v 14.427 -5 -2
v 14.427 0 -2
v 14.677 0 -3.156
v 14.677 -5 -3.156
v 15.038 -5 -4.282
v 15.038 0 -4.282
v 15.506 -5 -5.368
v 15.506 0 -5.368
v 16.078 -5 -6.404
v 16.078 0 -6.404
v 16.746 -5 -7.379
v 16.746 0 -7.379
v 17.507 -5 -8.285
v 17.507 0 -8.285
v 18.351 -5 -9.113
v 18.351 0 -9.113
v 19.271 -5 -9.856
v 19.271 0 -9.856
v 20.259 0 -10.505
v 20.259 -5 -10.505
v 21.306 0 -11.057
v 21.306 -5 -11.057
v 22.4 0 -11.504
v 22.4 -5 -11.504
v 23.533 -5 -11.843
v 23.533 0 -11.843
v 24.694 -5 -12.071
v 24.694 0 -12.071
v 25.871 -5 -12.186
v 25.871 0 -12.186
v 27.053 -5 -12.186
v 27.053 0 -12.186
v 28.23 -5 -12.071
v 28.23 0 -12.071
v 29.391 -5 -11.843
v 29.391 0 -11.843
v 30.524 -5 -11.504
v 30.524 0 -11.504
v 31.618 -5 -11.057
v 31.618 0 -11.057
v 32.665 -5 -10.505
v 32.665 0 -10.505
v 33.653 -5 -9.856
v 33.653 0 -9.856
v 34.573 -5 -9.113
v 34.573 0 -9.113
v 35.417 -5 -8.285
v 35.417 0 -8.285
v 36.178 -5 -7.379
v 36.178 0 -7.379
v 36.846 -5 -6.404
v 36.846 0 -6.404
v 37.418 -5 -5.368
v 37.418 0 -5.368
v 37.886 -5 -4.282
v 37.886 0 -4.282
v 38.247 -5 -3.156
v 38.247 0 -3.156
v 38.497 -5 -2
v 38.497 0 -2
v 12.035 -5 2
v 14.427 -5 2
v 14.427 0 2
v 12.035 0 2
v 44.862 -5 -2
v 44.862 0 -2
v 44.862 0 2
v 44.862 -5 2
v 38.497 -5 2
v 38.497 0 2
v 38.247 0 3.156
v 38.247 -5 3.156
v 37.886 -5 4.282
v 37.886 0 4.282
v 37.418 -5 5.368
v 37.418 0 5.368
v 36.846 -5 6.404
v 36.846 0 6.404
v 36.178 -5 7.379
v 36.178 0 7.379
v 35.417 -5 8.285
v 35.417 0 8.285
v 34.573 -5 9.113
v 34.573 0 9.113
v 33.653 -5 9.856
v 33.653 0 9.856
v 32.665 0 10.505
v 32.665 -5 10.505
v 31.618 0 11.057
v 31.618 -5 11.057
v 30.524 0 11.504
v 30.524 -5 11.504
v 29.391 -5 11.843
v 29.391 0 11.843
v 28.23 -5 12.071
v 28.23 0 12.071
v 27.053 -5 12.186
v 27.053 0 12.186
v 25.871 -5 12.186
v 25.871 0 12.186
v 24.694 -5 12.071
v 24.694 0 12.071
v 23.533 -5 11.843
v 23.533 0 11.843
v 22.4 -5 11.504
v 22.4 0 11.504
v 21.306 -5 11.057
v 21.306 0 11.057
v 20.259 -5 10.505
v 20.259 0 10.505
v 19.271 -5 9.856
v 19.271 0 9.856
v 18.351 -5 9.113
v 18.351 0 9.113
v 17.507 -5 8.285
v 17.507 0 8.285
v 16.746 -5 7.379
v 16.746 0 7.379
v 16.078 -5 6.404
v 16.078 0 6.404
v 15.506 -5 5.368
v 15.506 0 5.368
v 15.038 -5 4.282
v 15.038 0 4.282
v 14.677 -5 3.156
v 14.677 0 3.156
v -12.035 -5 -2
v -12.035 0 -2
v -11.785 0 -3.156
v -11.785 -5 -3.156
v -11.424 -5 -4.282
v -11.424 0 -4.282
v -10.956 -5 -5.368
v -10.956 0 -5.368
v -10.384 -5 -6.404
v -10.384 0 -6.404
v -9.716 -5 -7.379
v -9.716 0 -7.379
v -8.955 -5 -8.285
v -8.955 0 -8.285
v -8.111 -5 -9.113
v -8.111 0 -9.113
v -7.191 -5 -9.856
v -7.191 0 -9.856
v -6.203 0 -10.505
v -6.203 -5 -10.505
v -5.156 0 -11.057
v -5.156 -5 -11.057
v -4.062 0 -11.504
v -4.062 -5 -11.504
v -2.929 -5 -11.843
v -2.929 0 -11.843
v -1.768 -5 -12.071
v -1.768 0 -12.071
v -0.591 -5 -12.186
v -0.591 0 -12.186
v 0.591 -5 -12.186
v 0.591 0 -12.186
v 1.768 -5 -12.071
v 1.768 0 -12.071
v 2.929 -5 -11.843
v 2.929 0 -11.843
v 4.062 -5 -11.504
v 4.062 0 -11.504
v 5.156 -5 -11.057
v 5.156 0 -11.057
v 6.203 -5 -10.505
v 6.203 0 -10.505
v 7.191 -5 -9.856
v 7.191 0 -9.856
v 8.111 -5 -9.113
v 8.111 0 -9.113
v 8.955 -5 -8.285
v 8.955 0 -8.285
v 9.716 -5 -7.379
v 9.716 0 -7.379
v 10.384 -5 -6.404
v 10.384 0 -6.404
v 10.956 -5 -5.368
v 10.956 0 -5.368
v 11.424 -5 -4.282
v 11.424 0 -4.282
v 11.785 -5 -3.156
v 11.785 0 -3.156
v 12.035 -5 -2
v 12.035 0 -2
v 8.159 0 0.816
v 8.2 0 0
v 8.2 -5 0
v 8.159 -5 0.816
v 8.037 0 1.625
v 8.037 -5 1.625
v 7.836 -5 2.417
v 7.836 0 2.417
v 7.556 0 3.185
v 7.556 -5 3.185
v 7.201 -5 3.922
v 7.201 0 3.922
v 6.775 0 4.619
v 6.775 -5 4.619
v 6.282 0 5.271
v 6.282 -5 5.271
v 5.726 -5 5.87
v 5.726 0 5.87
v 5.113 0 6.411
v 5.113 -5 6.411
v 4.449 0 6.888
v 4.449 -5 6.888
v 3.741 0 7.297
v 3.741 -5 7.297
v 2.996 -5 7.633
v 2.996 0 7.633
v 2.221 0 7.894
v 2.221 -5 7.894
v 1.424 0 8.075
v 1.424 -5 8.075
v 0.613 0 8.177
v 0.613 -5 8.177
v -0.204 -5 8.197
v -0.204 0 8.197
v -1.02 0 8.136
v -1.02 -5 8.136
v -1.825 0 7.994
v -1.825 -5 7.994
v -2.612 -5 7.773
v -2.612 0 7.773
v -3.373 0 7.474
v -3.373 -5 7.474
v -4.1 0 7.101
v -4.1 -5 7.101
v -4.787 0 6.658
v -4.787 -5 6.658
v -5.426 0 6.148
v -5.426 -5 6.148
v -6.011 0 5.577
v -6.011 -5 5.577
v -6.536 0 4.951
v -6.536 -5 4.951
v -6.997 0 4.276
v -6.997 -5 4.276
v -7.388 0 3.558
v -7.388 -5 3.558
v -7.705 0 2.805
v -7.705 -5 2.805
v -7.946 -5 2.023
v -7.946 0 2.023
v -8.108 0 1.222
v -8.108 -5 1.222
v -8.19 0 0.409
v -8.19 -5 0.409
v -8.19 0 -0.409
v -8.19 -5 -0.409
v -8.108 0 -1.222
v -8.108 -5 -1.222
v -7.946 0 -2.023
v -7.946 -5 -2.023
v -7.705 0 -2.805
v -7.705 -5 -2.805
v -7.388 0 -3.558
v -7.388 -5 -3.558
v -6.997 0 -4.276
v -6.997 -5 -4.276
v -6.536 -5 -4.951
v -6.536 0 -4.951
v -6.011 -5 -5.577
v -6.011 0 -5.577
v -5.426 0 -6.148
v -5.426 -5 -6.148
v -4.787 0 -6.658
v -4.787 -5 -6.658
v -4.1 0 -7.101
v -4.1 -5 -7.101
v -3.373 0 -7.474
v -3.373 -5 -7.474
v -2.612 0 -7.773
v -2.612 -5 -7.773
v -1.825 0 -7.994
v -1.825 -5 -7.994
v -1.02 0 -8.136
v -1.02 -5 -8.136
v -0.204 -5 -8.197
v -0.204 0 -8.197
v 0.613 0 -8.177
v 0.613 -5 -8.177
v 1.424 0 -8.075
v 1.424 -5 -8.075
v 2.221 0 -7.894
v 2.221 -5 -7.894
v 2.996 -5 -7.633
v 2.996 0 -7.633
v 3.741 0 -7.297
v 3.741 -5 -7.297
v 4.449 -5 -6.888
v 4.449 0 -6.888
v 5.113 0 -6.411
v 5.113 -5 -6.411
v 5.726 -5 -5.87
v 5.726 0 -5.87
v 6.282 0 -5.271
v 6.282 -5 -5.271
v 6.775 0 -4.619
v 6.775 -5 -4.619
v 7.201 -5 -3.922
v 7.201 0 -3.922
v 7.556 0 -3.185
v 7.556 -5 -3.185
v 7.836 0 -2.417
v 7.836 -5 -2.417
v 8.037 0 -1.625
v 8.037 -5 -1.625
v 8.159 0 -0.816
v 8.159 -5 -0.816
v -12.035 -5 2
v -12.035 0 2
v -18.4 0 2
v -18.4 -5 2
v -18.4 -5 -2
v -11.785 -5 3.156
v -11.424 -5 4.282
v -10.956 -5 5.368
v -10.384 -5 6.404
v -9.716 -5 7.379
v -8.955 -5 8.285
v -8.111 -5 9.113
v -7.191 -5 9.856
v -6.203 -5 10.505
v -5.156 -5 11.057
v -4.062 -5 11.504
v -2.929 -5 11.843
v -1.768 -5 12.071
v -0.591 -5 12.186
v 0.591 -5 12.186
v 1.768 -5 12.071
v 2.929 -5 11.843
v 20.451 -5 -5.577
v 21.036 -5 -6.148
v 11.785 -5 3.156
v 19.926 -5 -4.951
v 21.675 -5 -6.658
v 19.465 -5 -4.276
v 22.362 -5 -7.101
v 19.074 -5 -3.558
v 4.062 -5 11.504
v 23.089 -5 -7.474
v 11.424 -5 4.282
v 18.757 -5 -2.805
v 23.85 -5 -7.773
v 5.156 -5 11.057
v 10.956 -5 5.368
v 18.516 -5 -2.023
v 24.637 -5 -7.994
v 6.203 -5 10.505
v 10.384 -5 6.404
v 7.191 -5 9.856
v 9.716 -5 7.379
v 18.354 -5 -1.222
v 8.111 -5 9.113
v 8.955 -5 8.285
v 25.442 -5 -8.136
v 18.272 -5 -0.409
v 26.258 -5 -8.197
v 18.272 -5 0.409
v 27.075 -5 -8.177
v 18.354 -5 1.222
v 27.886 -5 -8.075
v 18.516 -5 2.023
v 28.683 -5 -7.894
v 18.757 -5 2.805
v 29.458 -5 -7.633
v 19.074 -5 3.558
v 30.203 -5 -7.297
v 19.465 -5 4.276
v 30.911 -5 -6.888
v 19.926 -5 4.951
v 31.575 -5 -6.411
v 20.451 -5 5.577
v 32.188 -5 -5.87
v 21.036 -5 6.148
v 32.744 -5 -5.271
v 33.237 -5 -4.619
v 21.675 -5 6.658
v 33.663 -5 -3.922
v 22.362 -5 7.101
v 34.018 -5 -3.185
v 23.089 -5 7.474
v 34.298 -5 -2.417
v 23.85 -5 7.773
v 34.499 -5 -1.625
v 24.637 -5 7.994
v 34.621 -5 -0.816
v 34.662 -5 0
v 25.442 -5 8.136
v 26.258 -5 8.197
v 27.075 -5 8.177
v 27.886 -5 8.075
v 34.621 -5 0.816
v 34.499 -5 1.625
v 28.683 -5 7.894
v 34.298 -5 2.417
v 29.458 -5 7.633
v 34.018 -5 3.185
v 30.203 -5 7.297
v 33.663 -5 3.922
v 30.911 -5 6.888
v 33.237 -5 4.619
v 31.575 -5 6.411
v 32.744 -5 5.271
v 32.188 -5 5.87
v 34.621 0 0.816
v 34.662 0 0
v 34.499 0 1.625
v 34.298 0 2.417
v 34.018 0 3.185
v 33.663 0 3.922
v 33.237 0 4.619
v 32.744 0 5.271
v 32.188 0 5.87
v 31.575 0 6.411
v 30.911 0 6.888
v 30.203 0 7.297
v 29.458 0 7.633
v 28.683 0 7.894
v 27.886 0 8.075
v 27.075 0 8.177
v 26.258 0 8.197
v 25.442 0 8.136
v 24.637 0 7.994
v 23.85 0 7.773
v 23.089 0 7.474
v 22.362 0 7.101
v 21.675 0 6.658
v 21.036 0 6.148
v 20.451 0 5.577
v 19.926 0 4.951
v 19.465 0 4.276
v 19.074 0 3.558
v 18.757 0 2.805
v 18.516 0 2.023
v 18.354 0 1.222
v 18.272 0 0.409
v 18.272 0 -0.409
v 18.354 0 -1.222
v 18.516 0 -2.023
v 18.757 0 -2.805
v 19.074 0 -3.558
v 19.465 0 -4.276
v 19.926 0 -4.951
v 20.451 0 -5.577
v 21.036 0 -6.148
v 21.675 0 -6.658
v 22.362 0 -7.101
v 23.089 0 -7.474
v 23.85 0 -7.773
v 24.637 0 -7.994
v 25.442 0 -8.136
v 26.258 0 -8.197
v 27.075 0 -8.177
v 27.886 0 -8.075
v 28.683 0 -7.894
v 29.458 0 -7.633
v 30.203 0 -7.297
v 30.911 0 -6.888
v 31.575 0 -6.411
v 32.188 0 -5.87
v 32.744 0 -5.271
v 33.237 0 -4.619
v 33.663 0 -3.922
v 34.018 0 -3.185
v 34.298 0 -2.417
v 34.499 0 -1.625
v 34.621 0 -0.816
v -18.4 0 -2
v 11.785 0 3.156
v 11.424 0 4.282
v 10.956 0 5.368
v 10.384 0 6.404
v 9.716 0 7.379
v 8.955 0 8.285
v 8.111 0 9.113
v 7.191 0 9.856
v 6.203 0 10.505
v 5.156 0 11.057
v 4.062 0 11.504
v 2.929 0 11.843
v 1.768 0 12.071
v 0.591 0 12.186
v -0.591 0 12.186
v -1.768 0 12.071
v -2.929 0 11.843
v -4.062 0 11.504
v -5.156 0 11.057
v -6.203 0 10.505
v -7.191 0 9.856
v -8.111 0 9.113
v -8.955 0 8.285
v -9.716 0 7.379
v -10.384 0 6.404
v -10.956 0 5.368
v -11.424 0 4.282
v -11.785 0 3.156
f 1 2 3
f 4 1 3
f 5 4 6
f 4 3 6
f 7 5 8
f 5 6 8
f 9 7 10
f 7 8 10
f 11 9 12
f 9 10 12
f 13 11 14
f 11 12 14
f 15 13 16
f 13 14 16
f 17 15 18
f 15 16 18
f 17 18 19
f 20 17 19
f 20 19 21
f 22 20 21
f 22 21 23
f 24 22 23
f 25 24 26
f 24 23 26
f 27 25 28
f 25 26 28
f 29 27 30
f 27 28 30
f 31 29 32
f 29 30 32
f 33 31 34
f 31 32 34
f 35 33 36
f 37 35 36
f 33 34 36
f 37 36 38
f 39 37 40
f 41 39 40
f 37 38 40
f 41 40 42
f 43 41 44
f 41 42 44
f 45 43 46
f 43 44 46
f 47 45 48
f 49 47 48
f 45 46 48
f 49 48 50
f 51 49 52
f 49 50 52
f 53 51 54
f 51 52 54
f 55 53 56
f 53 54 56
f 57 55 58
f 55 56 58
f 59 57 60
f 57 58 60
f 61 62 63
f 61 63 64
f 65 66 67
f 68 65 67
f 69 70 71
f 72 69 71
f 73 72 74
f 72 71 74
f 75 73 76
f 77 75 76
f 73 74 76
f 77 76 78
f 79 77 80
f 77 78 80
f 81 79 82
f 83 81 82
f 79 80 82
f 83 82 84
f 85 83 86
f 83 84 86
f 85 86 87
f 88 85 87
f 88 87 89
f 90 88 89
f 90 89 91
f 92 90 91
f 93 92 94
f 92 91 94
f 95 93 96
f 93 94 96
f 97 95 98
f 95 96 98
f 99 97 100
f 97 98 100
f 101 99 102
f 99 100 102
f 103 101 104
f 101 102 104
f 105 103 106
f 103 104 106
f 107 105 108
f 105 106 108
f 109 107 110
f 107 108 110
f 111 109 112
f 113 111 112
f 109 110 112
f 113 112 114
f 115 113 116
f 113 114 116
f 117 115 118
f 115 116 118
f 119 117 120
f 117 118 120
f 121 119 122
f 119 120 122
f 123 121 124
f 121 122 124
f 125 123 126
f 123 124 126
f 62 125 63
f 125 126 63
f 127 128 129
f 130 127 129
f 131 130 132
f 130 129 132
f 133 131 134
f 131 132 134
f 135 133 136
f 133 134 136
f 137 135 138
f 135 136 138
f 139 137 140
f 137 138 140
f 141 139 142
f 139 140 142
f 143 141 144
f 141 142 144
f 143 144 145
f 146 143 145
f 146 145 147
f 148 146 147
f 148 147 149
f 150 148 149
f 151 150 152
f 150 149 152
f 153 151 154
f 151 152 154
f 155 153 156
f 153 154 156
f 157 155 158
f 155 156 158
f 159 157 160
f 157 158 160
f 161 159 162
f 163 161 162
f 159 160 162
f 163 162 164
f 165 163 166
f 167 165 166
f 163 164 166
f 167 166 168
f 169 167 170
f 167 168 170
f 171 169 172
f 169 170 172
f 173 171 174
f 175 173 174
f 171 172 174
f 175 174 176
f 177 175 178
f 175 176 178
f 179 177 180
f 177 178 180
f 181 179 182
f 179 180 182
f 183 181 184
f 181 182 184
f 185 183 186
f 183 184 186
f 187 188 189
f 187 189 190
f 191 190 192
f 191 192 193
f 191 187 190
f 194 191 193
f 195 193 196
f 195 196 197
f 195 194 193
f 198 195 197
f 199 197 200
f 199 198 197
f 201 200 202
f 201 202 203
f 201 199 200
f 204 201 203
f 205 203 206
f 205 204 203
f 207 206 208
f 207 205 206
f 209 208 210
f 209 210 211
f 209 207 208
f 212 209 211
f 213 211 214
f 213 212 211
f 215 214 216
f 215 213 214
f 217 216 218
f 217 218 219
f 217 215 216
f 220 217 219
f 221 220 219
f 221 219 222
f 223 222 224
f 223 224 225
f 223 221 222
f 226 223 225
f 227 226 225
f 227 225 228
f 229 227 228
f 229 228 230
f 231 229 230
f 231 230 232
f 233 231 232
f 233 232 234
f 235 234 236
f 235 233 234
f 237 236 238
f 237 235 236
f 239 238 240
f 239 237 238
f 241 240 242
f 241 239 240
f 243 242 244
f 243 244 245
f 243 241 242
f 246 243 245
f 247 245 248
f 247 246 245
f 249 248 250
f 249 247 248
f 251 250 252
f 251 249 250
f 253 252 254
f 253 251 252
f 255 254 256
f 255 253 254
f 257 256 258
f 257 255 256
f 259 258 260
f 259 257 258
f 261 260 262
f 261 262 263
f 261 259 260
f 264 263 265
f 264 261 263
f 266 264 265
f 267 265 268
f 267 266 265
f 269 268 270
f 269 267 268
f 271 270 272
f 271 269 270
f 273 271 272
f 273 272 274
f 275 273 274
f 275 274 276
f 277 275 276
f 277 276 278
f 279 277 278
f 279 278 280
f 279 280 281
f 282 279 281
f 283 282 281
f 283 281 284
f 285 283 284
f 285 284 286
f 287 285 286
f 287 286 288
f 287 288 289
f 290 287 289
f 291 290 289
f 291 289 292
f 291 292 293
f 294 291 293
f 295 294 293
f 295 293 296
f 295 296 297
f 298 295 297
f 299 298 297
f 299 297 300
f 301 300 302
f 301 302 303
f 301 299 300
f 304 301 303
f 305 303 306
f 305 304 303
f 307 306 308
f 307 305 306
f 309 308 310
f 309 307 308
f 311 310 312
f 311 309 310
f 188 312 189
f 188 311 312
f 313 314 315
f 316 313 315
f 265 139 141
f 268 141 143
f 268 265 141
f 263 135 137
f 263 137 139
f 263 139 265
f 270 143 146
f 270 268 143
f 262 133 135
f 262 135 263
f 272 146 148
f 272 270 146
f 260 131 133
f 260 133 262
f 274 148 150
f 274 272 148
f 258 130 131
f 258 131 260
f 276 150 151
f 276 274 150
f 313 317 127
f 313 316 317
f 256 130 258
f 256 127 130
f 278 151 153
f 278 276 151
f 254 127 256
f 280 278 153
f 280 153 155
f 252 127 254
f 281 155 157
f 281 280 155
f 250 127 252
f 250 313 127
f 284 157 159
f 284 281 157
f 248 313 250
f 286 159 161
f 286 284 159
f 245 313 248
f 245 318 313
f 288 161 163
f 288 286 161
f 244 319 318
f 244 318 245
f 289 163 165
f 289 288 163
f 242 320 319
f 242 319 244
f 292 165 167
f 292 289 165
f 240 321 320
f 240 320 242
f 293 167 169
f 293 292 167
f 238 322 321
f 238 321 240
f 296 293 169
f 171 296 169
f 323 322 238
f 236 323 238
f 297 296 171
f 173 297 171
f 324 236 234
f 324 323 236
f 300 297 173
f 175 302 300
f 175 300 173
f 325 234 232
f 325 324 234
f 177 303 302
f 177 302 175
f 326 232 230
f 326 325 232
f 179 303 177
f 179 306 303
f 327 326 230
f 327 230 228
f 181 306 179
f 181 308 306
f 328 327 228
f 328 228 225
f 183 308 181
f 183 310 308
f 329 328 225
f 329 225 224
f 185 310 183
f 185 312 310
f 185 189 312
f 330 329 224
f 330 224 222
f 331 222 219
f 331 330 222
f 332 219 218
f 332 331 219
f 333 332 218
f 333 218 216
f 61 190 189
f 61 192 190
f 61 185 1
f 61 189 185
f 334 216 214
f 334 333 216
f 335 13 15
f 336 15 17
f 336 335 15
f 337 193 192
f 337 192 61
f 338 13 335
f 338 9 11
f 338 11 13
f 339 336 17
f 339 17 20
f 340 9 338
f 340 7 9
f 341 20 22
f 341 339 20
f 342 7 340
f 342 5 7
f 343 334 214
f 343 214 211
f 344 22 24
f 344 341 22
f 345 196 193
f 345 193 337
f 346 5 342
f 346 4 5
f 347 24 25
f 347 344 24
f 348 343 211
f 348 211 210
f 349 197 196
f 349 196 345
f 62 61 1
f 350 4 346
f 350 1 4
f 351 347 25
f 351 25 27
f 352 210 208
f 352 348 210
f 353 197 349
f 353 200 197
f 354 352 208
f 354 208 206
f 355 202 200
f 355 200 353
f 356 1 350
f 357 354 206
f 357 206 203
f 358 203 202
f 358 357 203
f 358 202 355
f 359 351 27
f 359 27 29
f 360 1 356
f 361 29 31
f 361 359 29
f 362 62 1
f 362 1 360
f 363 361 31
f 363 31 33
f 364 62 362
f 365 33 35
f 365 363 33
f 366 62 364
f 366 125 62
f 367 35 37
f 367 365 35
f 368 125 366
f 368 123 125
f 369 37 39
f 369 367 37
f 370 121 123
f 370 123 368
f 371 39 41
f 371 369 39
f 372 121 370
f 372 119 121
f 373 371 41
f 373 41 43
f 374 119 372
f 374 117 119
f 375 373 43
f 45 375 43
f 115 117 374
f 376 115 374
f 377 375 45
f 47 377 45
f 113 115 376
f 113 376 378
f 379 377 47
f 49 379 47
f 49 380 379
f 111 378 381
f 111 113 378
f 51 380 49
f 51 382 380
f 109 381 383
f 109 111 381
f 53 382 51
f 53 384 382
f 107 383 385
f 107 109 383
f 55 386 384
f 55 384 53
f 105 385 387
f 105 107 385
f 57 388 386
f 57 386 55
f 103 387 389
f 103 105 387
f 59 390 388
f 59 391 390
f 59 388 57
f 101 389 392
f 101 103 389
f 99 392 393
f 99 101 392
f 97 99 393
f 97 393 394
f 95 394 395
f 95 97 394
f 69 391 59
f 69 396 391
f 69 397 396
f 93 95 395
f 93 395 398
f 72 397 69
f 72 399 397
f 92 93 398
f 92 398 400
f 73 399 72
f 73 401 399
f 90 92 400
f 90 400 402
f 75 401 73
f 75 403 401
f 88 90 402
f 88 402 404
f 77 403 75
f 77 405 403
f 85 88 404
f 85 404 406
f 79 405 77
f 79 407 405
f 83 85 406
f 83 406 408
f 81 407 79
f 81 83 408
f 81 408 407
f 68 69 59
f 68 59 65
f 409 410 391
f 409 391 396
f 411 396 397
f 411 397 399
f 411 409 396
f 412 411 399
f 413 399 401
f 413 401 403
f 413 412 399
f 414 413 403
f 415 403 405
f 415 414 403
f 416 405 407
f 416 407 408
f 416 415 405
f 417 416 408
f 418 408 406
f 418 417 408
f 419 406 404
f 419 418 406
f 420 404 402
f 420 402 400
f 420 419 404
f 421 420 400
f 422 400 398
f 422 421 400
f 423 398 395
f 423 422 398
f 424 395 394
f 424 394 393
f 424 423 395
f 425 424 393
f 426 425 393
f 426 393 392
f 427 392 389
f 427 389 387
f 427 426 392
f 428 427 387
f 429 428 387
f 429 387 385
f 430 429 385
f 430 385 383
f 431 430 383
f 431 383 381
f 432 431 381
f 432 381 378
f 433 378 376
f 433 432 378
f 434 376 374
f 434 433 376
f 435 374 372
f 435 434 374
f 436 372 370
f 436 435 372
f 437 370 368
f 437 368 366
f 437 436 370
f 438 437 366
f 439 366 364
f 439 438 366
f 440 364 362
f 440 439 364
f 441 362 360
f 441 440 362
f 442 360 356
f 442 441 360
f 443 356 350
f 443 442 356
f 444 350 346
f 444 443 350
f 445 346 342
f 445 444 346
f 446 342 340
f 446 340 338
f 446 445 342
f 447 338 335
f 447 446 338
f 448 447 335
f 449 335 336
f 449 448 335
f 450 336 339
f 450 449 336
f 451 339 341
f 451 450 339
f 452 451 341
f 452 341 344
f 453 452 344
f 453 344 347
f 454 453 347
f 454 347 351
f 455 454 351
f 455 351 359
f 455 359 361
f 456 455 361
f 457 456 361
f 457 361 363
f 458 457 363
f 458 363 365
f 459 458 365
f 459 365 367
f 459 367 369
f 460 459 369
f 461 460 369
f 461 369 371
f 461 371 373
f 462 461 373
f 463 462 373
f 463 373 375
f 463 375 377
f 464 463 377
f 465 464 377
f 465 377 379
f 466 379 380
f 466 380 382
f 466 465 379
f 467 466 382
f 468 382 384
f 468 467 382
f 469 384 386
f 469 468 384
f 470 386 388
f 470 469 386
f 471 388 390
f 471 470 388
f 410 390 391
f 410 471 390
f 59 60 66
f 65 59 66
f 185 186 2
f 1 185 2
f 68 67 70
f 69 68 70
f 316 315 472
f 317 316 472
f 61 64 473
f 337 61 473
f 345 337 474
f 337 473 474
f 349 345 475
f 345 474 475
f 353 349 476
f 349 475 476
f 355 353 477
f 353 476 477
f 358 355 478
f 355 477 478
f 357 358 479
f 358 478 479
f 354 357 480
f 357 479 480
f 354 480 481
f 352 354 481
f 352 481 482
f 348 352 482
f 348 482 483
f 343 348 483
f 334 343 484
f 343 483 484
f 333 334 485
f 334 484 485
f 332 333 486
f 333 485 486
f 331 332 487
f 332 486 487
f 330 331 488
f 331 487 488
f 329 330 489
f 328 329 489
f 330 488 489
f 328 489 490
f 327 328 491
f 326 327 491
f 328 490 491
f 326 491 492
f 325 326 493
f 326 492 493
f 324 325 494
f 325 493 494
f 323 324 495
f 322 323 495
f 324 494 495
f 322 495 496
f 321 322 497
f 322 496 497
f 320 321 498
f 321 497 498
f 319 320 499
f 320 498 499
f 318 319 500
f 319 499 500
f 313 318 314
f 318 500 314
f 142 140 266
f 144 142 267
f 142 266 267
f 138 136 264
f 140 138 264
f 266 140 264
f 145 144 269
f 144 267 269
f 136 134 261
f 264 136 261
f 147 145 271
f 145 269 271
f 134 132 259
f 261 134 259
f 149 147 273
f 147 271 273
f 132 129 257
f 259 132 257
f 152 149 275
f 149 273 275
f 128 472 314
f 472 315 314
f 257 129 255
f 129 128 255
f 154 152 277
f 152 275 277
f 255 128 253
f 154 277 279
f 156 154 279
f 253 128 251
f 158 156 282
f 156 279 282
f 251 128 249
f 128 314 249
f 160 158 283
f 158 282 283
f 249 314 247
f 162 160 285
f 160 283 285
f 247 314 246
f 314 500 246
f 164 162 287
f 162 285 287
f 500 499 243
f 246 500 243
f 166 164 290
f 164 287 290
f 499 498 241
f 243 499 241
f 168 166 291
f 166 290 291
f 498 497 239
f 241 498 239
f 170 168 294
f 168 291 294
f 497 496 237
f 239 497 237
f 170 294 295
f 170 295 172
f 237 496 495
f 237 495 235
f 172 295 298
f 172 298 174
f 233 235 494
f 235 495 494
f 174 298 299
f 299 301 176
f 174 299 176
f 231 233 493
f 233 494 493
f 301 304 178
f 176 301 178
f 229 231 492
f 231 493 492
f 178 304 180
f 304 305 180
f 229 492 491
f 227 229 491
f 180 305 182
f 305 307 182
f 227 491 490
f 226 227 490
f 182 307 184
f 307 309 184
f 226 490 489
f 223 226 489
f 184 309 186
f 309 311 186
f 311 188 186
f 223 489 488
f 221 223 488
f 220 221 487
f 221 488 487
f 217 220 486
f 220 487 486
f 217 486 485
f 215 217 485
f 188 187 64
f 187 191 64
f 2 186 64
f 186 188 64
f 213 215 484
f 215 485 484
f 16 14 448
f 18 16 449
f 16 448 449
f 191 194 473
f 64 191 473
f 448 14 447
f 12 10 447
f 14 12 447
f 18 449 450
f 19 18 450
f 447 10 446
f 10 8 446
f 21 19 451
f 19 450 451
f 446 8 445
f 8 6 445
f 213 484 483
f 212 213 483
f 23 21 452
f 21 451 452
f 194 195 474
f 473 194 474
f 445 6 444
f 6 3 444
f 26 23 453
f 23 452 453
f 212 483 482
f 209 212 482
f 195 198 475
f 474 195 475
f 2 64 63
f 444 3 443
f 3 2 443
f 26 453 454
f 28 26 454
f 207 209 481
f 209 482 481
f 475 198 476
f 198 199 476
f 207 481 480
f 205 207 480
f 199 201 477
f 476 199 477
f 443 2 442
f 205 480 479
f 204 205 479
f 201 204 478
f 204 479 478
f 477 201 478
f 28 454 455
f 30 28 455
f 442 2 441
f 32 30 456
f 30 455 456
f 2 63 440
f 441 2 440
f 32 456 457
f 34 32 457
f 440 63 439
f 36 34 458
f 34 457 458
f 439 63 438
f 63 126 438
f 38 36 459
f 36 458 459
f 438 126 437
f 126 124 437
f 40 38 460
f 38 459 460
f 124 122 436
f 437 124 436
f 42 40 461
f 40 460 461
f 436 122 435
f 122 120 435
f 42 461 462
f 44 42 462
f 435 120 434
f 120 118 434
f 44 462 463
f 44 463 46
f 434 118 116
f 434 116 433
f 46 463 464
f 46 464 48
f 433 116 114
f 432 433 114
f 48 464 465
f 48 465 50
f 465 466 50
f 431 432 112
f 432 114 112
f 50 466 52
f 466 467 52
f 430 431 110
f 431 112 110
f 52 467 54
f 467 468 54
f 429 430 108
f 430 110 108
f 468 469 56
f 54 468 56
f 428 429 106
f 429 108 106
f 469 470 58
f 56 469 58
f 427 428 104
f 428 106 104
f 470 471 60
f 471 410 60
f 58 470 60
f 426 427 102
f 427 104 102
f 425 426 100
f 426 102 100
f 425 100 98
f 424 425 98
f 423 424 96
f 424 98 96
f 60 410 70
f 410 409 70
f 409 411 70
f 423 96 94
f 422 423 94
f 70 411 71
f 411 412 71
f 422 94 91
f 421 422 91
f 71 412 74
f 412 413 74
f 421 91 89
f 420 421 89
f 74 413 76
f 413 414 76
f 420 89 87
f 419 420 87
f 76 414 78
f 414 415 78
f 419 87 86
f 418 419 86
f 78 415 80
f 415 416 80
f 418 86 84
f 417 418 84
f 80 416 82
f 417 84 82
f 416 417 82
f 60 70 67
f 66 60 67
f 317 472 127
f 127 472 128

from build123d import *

# Parameters (mm, degrees)
F0_R     = 8.2
F1_DEPTH = 5


with BuildPart() as f1:
    # F0 (on Front) → F1 (new body)
    with BuildSketch(Plane.XZ):
        with BuildLine():
            Line((-18.4, -2), (-12.034949, -2))
            ThreePointArc((-12.034949, -2), (0, -12.2), (12.034949, -2))
            Line((12.034949, -2), (14.427051, -2))
            ThreePointArc((14.427051, -2), (26.462, -12.2), (38.496949, -2))
            Line((38.496949, -2), (44.862, -2))
            Line((44.862, -2), (44.862, 2))
            Line((44.862, 2), (38.496949, 2))
            ThreePointArc((38.496949, 2), (26.462, 12.2), (14.427051, 2))
            Line((14.427051, 2), (12.034949, 2))
            ThreePointArc((12.034949, 2), (0, 12.2), (-12.034949, 2))
            Line((-12.034949, 2), (-18.4, 2))
            Line((-18.4, 2), (-18.4, -2))
        make_face()
        Circle(F0_R, mode=Mode.SUBTRACT)
        with Locations((26.462, 0)):
            Circle(F0_R, mode=Mode.SUBTRACT)
    extrude(amount=F1_DEPTH)


solid = f1.part
